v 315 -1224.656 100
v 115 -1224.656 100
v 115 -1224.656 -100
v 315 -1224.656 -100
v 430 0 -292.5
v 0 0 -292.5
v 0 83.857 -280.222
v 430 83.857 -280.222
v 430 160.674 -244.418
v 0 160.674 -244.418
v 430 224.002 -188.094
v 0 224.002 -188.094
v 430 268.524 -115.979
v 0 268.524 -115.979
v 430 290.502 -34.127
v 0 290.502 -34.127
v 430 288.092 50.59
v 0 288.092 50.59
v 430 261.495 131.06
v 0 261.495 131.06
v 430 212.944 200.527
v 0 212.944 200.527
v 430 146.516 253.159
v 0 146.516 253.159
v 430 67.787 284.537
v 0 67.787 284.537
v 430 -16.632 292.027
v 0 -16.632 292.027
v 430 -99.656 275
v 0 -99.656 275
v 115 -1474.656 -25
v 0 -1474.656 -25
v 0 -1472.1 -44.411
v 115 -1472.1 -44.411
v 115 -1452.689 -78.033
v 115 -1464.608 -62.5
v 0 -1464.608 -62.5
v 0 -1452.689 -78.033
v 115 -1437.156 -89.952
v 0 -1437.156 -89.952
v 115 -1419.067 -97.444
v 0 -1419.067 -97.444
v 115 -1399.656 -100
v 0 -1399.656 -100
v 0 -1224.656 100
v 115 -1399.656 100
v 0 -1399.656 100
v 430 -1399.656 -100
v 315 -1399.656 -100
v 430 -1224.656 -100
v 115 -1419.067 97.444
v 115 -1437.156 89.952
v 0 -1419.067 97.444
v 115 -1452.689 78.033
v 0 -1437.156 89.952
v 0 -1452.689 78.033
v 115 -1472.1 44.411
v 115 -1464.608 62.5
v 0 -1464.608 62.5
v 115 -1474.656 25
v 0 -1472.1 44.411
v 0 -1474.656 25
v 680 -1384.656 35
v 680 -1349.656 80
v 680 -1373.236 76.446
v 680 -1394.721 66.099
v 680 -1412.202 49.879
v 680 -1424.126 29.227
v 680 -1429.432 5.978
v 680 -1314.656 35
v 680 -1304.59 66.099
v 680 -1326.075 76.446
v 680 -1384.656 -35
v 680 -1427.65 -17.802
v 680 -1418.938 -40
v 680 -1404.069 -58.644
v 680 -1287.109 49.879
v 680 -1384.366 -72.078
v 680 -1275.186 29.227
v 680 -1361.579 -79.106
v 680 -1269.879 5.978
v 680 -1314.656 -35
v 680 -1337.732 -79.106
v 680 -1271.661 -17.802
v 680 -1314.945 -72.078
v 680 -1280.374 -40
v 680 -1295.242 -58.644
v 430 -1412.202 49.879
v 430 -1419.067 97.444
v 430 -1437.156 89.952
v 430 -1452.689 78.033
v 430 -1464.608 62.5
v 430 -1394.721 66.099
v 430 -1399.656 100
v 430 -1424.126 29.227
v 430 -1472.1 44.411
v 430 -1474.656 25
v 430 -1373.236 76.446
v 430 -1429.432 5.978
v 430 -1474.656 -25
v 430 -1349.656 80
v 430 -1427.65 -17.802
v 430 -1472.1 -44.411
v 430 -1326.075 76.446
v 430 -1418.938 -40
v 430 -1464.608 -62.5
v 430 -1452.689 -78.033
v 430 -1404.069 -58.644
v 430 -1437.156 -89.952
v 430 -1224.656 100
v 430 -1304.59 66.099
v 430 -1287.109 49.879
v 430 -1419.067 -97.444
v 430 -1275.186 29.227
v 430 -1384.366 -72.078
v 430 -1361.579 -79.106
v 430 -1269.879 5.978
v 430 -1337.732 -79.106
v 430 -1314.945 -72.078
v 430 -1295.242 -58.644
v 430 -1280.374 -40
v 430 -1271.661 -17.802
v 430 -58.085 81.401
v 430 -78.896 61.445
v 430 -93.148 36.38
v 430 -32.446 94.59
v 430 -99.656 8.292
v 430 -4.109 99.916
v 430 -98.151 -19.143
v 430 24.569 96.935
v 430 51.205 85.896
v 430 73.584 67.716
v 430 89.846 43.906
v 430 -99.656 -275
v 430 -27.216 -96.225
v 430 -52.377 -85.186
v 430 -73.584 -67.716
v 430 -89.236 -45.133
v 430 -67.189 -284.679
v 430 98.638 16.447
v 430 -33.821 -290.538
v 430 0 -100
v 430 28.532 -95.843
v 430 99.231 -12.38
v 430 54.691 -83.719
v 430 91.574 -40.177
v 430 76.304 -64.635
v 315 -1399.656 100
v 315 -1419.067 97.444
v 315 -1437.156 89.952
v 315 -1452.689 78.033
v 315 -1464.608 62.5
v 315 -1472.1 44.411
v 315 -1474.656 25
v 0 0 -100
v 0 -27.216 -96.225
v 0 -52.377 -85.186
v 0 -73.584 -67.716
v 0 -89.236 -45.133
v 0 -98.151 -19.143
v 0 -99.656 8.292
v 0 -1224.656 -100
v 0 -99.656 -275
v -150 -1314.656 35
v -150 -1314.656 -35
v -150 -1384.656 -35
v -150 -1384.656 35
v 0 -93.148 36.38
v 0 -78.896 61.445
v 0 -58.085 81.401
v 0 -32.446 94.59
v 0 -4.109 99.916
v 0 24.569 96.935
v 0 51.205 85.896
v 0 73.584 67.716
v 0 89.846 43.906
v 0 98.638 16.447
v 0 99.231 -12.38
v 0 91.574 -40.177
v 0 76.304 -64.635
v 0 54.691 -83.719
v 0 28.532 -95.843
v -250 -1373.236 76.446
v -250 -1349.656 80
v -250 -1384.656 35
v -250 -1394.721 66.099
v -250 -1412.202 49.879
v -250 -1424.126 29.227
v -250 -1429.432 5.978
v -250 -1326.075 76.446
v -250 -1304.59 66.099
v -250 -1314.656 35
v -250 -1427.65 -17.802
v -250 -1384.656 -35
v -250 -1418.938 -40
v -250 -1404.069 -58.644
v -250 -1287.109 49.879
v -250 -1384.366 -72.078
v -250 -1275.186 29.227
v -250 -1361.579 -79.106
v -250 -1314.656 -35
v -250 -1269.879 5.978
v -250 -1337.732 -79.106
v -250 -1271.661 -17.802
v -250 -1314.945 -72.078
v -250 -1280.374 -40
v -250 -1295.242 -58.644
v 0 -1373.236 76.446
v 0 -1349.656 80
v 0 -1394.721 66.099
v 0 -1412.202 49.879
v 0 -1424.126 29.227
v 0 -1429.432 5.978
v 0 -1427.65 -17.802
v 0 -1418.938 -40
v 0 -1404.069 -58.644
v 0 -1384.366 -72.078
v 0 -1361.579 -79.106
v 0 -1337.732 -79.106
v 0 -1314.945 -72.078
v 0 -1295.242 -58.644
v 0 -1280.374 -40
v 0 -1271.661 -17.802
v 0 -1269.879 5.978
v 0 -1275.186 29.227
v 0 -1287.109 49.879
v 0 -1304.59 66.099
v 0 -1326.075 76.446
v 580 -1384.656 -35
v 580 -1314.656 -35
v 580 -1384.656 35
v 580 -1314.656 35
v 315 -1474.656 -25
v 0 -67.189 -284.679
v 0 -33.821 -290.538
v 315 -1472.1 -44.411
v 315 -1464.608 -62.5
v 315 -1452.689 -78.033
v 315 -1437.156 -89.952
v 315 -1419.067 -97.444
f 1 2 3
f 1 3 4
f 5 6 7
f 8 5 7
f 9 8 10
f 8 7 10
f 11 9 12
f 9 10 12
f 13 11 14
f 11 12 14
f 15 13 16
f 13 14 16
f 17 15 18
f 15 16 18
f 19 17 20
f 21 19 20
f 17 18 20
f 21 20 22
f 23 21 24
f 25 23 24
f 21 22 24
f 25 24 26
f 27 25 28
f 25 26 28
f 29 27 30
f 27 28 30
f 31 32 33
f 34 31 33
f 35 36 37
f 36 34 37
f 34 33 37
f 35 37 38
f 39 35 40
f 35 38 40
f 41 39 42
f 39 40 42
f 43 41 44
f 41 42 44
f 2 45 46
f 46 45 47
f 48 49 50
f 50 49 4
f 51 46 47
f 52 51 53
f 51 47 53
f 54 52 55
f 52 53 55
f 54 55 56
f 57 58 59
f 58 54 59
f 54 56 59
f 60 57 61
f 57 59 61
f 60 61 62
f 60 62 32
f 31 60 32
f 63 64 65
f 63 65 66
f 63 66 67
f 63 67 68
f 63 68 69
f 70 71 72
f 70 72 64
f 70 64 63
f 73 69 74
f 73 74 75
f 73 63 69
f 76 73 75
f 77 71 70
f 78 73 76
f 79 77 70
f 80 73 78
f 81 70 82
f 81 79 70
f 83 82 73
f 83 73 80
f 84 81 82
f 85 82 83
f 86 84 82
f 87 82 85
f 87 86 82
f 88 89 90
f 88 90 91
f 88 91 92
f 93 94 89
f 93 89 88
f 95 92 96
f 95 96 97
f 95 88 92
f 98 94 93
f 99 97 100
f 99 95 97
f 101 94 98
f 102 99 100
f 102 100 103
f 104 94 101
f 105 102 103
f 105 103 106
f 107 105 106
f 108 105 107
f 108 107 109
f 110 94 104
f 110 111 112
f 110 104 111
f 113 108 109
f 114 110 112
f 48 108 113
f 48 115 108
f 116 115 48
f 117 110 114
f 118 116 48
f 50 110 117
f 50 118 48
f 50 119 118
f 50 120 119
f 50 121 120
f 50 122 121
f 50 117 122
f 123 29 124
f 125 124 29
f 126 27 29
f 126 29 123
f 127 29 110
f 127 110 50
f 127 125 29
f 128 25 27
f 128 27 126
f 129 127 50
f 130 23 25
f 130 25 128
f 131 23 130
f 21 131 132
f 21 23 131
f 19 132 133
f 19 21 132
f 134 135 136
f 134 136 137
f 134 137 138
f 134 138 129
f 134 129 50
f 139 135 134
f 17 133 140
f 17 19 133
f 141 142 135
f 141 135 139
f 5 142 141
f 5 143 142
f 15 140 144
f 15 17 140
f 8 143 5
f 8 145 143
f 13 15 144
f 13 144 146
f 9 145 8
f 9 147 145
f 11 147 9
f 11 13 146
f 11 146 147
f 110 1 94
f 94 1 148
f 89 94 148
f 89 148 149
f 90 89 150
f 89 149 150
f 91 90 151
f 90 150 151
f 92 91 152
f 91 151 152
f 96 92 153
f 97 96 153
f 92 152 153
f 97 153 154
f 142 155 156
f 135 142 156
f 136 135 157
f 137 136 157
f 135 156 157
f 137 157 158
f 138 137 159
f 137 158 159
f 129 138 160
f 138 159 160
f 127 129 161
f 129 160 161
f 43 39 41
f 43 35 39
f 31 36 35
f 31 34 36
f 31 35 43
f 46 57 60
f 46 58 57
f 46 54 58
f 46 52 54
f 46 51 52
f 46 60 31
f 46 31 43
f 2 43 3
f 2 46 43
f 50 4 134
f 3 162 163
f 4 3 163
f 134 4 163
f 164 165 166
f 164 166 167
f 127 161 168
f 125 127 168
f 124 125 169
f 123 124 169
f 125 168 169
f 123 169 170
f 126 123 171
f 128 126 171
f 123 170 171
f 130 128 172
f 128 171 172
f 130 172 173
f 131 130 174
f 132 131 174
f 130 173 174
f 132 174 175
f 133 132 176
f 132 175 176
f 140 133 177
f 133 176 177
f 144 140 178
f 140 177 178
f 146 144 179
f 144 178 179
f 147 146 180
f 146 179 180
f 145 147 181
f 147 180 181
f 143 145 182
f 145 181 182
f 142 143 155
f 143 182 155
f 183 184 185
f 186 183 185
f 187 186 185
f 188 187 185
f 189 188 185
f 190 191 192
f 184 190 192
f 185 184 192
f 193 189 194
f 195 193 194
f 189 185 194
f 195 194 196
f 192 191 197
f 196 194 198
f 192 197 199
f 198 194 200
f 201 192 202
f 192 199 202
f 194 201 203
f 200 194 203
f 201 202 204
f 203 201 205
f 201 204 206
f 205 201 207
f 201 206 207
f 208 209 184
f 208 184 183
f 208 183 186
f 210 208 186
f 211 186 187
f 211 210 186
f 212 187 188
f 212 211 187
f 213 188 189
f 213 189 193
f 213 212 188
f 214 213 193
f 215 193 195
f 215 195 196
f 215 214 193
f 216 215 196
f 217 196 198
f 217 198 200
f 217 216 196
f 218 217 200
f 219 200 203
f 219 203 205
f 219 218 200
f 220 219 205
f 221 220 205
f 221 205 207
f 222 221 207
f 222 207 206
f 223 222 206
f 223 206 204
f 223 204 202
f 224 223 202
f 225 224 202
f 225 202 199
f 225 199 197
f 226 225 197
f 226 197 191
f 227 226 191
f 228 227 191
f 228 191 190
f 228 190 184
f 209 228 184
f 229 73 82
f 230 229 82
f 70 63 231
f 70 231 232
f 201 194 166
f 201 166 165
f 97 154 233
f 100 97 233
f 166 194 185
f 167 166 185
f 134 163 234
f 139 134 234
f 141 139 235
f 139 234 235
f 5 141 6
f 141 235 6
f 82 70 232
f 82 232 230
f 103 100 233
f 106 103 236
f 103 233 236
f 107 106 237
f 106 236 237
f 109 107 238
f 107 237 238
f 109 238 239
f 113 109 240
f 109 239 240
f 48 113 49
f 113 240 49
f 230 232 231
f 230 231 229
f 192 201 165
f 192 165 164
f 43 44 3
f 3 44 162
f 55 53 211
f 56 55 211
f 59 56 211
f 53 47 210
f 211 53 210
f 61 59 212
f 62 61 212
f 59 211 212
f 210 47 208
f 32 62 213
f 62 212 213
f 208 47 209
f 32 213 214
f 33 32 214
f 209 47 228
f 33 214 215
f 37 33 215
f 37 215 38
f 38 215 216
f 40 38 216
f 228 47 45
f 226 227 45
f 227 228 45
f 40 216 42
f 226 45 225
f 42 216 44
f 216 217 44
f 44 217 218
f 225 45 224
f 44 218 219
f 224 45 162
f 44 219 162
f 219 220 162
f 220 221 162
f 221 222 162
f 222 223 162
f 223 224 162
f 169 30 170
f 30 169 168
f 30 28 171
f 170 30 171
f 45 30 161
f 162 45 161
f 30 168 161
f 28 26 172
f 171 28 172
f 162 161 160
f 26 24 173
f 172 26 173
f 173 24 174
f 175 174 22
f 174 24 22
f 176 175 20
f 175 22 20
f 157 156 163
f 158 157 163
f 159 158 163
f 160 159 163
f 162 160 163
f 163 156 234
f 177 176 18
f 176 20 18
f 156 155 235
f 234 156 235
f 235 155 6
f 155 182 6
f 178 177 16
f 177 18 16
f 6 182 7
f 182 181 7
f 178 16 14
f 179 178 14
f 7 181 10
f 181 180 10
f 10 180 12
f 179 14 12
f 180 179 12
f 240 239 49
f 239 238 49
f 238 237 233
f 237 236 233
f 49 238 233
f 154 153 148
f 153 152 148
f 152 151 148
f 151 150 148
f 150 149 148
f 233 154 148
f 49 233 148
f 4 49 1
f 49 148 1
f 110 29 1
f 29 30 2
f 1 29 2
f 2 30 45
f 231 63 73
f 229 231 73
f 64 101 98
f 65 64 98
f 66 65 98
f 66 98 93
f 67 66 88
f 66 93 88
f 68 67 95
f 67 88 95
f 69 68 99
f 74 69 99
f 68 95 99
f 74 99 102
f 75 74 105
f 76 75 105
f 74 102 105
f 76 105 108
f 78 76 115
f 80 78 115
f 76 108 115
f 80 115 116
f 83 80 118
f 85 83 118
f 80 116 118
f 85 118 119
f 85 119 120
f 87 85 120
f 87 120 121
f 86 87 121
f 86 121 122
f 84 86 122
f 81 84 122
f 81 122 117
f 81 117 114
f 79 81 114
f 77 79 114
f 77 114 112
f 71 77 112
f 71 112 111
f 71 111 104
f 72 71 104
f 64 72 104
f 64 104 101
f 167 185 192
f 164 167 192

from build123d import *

# Parameters (mm, degrees)
ESQUISSE1_R             = 100
ESQUISSE1_R_2           = 80
BOSS_EXTRU_1_DEPTH      = 430
ESQUISSE1_3_R           = 80
BOSS_EXTRU_2_DEPTH      = 250
ESQUISSE1_5_R           = 80
BOSS_EXTRU_3_DEPTH      = 680
ESQUISSE2_W             = 200
ESQUISSE2_H             = 250
ENL_V_MAT_EXTRU_2_DEPTH = 680
ESQUISSE3_W             = 70
ESQUISSE3_H             = 70
ENL_V_MAT_EXTRU_3_DEPTH = 100
ESQUISSE4_W             = 70
ESQUISSE4_H             = 70
ENL_V_MAT_EXTRU_4_DEPTH = 100


with BuildPart() as part:
    # Esquisse1 → Boss.-Extru.1 (new body)
    with BuildSketch(Plane(origin=(0, 0, 0), x_dir=(0, 0, -1), z_dir=(1, 0, 0))):
        with BuildLine():
            Line((-275, -99.65565714), (-100, -1224.65565714))
            Line((-100, -1224.65565714), (-100, -1399.65565714))
            ThreePointArc((-100, -1399.65565714), (-78.033008589, -1452.688665729), (-25, -1474.65565714))
            Line((-25, -1474.65565714), (25, -1474.65565714))
            ThreePointArc((25, -1474.65565714), (78.033008589, -1452.688665729), (100, -1399.65565714))
            Line((100, -1399.65565714), (100, -1224.65565714))
            Line((100, -1224.65565714), (275, -99.65565714))
            ThreePointArc((275, -99.65565714), (0, 292.5), (-275, -99.65565714))
        make_face()
        Circle(ESQUISSE1_R, mode=Mode.SUBTRACT)
        with Locations((0, -1349.65565714)):
            Circle(ESQUISSE1_R_2, mode=Mode.SUBTRACT)
    extrude(amount=BOSS_EXTRU_1_DEPTH)



with BuildPart() as body_2:
    # Esquisse1<3> → Boss.-Extru.2 (new body)
    with BuildSketch(Plane(origin=(0, 0, 0), x_dir=(0, 0, -1), z_dir=(1, 0, 0))):
        with Locations((0, -1349.65565714)):
            Circle(ESQUISSE1_3_R)
    extrude(amount=-BOSS_EXTRU_2_DEPTH)


with BuildPart() as part_1:
    add(part.part)

    add(body_2.part)  # Boss.-Extru.3 merges body 2
    # Esquisse1<5> → Boss.-Extru.3 (add)
    with BuildSketch(Plane(origin=(0, 0, 0), x_dir=(0, 0, -1), z_dir=(1, 0, 0))):
        with Locations((0, -1349.65565714)):
            Circle(ESQUISSE1_5_R)
    extrude(amount=BOSS_EXTRU_3_DEPTH)

    # Esquisse2 → Enlèv. mat.-Extru.2 (cut)
    with BuildSketch(Plane.XY.offset(100)):
        with Locations((215, -1349.65565714)):
            Rectangle(ESQUISSE2_W, ESQUISSE2_H)
    extrude(amount=-ENL_V_MAT_EXTRU_2_DEPTH, mode=Mode.SUBTRACT)

    # Esquisse3 → Enlèv. mat.-Extru.3 (cut)
    with BuildSketch(Plane.ZY.offset(250)):
        with Locations((0, -1349.65565714)):
            Rectangle(ESQUISSE3_W, ESQUISSE3_H)
    extrude(amount=-ENL_V_MAT_EXTRU_3_DEPTH, mode=Mode.SUBTRACT)

    # Esquisse4 → Enlèv. mat.-Extru.4 (cut)
    with BuildSketch(Plane(origin=(680, 0, 0), x_dir=(0, 0, -1), z_dir=(1, 0, 0))):
        with Locations((0, -1349.65565714)):
            Rectangle(ESQUISSE4_W, ESQUISSE4_H)
    extrude(amount=-ENL_V_MAT_EXTRU_4_DEPTH, mode=Mode.SUBTRACT)


solid = part_1.part
